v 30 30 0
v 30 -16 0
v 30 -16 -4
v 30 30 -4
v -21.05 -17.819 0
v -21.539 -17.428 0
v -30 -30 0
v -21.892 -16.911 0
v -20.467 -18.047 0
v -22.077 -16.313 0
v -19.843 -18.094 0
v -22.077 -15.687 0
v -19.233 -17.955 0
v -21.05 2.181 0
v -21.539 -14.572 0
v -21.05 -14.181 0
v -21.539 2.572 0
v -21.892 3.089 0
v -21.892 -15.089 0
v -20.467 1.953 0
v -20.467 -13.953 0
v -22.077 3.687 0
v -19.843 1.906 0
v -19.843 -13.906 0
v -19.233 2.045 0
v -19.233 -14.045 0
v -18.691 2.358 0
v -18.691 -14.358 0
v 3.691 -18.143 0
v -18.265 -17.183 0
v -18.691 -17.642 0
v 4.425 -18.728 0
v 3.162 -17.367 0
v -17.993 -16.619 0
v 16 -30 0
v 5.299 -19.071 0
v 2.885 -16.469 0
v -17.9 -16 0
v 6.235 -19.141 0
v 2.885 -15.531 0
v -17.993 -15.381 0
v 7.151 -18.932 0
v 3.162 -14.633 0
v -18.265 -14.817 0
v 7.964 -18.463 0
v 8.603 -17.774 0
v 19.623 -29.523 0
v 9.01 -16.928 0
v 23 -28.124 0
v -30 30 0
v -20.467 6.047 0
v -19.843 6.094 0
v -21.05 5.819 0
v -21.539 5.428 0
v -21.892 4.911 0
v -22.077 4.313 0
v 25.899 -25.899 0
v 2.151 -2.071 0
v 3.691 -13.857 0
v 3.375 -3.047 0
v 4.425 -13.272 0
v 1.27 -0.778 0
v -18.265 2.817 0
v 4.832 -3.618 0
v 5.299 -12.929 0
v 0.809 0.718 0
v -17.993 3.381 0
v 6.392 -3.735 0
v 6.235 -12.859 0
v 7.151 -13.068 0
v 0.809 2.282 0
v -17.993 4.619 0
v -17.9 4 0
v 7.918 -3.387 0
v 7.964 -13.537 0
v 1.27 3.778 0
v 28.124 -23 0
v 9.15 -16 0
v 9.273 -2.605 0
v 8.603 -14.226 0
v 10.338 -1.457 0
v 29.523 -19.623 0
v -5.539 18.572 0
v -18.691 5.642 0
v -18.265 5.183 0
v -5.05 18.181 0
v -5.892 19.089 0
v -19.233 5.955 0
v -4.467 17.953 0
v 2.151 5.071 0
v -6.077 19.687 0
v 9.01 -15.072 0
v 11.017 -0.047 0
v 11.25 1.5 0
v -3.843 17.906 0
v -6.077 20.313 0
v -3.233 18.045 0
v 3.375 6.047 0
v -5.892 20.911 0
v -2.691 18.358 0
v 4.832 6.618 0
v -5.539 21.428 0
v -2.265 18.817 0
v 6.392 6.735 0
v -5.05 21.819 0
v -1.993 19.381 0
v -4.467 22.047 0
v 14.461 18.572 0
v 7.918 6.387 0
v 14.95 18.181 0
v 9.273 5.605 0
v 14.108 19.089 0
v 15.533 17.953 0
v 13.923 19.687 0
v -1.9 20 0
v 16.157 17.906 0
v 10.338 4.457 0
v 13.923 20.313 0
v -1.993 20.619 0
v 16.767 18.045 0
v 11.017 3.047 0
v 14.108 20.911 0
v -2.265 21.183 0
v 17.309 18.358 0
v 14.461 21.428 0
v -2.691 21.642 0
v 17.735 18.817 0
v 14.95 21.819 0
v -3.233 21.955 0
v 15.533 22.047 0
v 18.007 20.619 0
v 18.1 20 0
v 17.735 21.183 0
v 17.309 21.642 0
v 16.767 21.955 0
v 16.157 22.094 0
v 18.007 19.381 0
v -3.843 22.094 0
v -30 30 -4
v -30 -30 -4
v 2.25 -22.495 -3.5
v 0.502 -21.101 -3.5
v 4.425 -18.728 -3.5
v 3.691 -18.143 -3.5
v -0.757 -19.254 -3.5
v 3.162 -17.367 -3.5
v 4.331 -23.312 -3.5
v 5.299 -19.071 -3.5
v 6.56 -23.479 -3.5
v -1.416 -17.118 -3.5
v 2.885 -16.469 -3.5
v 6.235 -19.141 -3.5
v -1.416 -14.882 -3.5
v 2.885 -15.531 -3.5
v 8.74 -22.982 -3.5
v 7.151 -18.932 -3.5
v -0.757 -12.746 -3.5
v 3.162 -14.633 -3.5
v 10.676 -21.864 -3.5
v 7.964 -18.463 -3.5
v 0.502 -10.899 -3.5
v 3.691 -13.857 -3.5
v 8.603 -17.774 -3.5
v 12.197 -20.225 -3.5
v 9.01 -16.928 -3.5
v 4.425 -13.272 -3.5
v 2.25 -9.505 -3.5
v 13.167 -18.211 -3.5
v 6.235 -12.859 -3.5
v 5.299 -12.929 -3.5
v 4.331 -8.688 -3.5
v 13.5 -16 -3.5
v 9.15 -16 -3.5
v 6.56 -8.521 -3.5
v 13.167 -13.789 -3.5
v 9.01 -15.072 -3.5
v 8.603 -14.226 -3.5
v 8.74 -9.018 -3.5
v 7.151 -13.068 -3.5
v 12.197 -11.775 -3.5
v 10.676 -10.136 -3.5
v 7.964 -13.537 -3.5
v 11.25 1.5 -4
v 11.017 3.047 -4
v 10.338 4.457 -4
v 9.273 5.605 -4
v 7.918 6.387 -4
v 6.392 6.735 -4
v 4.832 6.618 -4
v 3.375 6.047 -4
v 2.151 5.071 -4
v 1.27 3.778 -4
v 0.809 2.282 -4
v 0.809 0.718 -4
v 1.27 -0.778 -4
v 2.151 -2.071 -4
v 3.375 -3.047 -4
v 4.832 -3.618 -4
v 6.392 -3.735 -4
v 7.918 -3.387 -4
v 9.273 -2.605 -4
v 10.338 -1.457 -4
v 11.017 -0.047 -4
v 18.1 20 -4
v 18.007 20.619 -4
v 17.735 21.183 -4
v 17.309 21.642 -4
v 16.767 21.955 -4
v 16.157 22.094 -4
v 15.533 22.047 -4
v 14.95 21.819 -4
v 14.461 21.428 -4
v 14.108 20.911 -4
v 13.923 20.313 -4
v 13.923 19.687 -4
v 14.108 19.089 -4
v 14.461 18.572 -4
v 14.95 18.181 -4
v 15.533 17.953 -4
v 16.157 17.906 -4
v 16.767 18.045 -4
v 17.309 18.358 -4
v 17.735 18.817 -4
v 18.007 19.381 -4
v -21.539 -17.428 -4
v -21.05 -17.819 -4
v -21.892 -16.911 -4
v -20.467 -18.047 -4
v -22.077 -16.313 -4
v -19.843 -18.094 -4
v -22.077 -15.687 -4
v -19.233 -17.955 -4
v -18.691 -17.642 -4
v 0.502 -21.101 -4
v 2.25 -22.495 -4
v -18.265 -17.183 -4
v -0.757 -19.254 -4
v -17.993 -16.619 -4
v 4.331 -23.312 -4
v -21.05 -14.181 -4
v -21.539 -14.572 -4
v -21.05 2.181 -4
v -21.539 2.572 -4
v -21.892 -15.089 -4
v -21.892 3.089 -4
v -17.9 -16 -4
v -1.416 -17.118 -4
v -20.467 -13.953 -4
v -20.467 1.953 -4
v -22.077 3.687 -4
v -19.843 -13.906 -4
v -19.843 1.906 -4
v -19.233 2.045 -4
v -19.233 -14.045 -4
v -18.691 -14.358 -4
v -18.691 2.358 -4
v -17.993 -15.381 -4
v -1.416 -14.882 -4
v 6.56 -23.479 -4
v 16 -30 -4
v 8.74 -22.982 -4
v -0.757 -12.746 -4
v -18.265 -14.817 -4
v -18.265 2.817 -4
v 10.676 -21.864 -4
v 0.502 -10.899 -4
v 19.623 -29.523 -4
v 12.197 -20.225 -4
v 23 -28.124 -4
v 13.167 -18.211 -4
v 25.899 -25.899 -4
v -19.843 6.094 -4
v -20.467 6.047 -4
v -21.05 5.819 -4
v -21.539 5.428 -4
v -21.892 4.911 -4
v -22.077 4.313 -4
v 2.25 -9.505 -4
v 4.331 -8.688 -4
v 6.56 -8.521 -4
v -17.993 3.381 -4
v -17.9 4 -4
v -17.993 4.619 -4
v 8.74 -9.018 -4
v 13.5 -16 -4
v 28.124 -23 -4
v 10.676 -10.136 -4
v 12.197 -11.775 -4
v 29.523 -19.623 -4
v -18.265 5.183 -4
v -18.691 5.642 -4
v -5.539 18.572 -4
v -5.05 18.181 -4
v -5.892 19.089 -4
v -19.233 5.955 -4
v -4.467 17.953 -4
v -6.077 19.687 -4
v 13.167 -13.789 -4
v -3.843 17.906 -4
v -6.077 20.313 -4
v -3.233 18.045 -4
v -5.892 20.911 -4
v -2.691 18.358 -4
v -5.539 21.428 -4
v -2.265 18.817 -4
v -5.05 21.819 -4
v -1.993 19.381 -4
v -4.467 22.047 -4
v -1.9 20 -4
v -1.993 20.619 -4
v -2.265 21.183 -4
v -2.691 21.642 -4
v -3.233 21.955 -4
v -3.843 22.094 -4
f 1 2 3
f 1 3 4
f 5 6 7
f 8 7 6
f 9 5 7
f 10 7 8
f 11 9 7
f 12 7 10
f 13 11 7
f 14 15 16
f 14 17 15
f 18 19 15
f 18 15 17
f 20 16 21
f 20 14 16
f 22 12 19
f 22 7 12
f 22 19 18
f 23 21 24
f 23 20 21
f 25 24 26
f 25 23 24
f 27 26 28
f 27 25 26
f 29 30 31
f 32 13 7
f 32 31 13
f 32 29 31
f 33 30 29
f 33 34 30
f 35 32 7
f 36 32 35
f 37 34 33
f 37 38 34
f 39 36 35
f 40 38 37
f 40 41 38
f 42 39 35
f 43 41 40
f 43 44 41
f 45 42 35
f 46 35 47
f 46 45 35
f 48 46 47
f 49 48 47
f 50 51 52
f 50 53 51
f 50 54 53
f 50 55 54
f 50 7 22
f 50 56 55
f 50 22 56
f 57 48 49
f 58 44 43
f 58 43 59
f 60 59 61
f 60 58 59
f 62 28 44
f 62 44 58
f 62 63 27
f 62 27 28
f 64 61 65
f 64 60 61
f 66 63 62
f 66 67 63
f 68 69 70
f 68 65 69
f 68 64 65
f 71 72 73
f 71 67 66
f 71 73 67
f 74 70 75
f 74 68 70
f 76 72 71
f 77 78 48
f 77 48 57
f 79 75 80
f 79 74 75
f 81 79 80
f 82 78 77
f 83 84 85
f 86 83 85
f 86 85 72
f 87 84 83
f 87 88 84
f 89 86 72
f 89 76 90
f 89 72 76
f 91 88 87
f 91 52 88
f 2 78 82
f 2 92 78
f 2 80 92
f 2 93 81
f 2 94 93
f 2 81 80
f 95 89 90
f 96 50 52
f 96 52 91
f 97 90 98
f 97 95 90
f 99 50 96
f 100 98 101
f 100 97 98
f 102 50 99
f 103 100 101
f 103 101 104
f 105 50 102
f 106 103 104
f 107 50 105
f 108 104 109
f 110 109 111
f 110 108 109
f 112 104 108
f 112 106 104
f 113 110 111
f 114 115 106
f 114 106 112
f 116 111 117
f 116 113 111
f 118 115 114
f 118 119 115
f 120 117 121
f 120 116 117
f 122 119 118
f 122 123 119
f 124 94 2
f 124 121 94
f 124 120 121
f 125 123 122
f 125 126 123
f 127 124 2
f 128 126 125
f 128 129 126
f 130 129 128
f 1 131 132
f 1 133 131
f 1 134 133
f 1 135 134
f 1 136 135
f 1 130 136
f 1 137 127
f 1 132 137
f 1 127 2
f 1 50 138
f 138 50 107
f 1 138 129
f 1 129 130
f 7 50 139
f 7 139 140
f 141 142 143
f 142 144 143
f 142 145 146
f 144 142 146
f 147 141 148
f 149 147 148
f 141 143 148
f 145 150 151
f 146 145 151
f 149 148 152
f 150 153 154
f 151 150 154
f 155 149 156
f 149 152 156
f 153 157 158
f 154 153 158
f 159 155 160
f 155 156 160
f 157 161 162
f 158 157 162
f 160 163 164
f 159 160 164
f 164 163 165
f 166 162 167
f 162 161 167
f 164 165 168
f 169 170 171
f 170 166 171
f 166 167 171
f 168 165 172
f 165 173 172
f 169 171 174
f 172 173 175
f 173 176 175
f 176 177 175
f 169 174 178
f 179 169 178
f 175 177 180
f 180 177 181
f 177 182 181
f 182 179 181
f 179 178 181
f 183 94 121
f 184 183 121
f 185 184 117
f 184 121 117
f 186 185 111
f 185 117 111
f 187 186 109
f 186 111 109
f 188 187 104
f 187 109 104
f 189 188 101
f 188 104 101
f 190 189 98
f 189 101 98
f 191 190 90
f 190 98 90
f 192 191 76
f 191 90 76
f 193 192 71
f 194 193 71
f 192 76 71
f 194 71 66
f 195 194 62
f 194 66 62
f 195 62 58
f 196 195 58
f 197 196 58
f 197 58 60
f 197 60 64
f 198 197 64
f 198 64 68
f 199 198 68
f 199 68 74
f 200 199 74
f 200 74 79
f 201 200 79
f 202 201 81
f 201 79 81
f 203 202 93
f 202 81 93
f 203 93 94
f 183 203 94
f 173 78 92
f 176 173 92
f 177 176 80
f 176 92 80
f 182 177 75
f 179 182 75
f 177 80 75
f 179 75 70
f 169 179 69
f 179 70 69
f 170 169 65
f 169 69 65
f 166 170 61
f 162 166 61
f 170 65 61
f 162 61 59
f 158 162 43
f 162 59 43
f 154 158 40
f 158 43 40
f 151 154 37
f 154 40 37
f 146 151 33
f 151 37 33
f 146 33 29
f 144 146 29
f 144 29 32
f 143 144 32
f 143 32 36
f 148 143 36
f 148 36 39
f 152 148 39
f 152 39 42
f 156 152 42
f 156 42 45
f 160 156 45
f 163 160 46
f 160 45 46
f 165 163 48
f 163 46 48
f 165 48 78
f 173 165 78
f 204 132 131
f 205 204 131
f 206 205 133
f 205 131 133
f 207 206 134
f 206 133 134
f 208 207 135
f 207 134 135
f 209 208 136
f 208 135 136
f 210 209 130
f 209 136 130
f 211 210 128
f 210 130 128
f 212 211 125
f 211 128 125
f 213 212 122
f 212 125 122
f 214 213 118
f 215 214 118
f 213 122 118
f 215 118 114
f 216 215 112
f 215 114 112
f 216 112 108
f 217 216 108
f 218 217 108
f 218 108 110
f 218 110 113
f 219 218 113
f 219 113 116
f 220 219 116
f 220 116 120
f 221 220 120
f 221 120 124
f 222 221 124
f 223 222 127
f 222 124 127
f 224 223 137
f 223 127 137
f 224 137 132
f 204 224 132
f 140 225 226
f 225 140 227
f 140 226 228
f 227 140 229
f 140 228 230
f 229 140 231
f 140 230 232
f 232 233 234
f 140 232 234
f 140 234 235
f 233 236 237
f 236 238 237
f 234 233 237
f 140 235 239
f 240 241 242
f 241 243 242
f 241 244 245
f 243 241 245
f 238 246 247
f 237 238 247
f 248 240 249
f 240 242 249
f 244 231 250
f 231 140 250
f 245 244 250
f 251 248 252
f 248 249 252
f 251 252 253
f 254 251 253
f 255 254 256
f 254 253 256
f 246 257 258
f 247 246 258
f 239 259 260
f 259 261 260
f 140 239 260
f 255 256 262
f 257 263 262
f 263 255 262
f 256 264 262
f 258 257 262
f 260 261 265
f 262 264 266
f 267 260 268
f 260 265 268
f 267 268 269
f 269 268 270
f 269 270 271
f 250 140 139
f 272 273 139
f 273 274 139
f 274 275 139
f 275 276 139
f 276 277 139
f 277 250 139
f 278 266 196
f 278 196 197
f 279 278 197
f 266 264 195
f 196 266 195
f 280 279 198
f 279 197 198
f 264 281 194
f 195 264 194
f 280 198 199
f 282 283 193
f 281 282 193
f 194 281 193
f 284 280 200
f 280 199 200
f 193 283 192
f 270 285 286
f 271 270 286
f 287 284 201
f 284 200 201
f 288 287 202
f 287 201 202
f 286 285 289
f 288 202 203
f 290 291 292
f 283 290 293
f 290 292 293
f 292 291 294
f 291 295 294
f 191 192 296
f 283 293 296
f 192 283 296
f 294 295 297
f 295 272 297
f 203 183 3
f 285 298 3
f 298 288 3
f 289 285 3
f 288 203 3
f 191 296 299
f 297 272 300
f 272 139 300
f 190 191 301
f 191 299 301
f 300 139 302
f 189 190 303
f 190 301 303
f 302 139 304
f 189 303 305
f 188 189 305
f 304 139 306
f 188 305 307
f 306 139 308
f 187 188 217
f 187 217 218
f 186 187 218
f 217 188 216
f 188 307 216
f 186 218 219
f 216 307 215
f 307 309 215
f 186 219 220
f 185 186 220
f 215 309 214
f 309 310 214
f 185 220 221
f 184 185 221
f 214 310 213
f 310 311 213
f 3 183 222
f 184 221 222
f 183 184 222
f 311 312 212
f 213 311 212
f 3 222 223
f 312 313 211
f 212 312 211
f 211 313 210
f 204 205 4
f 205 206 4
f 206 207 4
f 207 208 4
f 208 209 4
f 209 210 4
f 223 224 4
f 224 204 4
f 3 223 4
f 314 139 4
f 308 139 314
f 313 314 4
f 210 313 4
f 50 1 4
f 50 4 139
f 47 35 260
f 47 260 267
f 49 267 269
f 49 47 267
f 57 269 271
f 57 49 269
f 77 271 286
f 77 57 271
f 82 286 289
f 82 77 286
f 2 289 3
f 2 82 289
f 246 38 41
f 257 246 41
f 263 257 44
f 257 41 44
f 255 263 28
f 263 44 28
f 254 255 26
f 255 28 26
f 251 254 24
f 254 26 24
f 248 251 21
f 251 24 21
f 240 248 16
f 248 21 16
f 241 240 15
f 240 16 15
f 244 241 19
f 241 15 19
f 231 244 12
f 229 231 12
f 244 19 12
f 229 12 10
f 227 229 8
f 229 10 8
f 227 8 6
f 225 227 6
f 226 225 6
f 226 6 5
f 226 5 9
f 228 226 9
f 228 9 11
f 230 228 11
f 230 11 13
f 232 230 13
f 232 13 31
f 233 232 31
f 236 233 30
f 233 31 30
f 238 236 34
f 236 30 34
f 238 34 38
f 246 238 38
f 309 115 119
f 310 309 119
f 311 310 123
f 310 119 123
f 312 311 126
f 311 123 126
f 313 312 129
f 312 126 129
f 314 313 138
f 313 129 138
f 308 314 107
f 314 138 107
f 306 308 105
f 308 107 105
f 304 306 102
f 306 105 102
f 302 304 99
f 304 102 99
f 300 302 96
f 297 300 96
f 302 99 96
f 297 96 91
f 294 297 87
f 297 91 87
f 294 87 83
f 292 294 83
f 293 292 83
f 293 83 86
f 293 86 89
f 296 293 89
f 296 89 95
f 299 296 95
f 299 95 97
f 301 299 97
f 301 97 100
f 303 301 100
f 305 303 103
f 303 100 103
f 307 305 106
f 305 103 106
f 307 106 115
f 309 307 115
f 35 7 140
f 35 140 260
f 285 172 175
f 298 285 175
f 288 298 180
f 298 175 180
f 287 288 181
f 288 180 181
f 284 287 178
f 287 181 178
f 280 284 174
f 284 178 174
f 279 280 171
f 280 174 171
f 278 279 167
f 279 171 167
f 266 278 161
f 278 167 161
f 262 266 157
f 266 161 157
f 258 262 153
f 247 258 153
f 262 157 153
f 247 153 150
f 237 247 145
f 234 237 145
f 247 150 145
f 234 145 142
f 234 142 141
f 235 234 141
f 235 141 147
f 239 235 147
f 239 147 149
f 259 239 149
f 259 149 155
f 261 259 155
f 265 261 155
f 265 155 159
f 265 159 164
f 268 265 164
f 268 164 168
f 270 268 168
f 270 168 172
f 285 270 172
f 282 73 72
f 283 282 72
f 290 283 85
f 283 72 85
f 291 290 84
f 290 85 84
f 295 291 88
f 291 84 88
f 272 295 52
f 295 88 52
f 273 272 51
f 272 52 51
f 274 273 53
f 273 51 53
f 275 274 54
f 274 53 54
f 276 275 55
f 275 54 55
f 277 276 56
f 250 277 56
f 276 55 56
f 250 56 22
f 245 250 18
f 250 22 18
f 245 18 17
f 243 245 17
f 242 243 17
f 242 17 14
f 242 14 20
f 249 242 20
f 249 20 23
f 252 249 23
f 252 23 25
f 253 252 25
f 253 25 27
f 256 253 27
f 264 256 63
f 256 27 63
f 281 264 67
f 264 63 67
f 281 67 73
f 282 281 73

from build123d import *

# Parameters (mm, degrees)
F0_R     = 2.1
F0_R_2   = 7.5
F0_R_3   = 5.25
F1_DEPTH = 4
F0_R_4   = 3.15
F2_DEPTH = 3.5


with BuildPart() as f1:
    # F0 (on Top) → F1 (new body)
    with BuildSketch(Plane.XY):
        with BuildLine():
            Line((30, -16), (30, 30))
            Line((30, 30), (-30, 30))
            Line((-30, 30), (-30, -30))
            Line((-30, -30), (16, -30))
            ThreePointArc((16, -30), (25.899495, -25.899495), (30, -16))
        make_face()
        with Locations((-20, -16)):
            Circle(F0_R, mode=Mode.SUBTRACT)
        with Locations((6, -16)):
            Circle(F0_R_2, mode=Mode.SUBTRACT)
        with Locations((-20, 4)):
            Circle(F0_R, mode=Mode.SUBTRACT)
        with Locations((-4, 20)):
            Circle(F0_R, mode=Mode.SUBTRACT)
        with Locations((6, 1.5)):
            Circle(F0_R_3, mode=Mode.SUBTRACT)
        with Locations((16, 20)):
            Circle(F0_R, mode=Mode.SUBTRACT)
    extrude(amount=-F1_DEPTH)

    # F0 (on Top) → F2 (join)
    with BuildSketch(Plane.XY):
        with Locations((6, -16)):
            Circle(F0_R_2)
        with Locations((6, -16)):
            Circle(F0_R_4, mode=Mode.SUBTRACT)
    extrude(amount=-F2_DEPTH)


solid = f1.part
